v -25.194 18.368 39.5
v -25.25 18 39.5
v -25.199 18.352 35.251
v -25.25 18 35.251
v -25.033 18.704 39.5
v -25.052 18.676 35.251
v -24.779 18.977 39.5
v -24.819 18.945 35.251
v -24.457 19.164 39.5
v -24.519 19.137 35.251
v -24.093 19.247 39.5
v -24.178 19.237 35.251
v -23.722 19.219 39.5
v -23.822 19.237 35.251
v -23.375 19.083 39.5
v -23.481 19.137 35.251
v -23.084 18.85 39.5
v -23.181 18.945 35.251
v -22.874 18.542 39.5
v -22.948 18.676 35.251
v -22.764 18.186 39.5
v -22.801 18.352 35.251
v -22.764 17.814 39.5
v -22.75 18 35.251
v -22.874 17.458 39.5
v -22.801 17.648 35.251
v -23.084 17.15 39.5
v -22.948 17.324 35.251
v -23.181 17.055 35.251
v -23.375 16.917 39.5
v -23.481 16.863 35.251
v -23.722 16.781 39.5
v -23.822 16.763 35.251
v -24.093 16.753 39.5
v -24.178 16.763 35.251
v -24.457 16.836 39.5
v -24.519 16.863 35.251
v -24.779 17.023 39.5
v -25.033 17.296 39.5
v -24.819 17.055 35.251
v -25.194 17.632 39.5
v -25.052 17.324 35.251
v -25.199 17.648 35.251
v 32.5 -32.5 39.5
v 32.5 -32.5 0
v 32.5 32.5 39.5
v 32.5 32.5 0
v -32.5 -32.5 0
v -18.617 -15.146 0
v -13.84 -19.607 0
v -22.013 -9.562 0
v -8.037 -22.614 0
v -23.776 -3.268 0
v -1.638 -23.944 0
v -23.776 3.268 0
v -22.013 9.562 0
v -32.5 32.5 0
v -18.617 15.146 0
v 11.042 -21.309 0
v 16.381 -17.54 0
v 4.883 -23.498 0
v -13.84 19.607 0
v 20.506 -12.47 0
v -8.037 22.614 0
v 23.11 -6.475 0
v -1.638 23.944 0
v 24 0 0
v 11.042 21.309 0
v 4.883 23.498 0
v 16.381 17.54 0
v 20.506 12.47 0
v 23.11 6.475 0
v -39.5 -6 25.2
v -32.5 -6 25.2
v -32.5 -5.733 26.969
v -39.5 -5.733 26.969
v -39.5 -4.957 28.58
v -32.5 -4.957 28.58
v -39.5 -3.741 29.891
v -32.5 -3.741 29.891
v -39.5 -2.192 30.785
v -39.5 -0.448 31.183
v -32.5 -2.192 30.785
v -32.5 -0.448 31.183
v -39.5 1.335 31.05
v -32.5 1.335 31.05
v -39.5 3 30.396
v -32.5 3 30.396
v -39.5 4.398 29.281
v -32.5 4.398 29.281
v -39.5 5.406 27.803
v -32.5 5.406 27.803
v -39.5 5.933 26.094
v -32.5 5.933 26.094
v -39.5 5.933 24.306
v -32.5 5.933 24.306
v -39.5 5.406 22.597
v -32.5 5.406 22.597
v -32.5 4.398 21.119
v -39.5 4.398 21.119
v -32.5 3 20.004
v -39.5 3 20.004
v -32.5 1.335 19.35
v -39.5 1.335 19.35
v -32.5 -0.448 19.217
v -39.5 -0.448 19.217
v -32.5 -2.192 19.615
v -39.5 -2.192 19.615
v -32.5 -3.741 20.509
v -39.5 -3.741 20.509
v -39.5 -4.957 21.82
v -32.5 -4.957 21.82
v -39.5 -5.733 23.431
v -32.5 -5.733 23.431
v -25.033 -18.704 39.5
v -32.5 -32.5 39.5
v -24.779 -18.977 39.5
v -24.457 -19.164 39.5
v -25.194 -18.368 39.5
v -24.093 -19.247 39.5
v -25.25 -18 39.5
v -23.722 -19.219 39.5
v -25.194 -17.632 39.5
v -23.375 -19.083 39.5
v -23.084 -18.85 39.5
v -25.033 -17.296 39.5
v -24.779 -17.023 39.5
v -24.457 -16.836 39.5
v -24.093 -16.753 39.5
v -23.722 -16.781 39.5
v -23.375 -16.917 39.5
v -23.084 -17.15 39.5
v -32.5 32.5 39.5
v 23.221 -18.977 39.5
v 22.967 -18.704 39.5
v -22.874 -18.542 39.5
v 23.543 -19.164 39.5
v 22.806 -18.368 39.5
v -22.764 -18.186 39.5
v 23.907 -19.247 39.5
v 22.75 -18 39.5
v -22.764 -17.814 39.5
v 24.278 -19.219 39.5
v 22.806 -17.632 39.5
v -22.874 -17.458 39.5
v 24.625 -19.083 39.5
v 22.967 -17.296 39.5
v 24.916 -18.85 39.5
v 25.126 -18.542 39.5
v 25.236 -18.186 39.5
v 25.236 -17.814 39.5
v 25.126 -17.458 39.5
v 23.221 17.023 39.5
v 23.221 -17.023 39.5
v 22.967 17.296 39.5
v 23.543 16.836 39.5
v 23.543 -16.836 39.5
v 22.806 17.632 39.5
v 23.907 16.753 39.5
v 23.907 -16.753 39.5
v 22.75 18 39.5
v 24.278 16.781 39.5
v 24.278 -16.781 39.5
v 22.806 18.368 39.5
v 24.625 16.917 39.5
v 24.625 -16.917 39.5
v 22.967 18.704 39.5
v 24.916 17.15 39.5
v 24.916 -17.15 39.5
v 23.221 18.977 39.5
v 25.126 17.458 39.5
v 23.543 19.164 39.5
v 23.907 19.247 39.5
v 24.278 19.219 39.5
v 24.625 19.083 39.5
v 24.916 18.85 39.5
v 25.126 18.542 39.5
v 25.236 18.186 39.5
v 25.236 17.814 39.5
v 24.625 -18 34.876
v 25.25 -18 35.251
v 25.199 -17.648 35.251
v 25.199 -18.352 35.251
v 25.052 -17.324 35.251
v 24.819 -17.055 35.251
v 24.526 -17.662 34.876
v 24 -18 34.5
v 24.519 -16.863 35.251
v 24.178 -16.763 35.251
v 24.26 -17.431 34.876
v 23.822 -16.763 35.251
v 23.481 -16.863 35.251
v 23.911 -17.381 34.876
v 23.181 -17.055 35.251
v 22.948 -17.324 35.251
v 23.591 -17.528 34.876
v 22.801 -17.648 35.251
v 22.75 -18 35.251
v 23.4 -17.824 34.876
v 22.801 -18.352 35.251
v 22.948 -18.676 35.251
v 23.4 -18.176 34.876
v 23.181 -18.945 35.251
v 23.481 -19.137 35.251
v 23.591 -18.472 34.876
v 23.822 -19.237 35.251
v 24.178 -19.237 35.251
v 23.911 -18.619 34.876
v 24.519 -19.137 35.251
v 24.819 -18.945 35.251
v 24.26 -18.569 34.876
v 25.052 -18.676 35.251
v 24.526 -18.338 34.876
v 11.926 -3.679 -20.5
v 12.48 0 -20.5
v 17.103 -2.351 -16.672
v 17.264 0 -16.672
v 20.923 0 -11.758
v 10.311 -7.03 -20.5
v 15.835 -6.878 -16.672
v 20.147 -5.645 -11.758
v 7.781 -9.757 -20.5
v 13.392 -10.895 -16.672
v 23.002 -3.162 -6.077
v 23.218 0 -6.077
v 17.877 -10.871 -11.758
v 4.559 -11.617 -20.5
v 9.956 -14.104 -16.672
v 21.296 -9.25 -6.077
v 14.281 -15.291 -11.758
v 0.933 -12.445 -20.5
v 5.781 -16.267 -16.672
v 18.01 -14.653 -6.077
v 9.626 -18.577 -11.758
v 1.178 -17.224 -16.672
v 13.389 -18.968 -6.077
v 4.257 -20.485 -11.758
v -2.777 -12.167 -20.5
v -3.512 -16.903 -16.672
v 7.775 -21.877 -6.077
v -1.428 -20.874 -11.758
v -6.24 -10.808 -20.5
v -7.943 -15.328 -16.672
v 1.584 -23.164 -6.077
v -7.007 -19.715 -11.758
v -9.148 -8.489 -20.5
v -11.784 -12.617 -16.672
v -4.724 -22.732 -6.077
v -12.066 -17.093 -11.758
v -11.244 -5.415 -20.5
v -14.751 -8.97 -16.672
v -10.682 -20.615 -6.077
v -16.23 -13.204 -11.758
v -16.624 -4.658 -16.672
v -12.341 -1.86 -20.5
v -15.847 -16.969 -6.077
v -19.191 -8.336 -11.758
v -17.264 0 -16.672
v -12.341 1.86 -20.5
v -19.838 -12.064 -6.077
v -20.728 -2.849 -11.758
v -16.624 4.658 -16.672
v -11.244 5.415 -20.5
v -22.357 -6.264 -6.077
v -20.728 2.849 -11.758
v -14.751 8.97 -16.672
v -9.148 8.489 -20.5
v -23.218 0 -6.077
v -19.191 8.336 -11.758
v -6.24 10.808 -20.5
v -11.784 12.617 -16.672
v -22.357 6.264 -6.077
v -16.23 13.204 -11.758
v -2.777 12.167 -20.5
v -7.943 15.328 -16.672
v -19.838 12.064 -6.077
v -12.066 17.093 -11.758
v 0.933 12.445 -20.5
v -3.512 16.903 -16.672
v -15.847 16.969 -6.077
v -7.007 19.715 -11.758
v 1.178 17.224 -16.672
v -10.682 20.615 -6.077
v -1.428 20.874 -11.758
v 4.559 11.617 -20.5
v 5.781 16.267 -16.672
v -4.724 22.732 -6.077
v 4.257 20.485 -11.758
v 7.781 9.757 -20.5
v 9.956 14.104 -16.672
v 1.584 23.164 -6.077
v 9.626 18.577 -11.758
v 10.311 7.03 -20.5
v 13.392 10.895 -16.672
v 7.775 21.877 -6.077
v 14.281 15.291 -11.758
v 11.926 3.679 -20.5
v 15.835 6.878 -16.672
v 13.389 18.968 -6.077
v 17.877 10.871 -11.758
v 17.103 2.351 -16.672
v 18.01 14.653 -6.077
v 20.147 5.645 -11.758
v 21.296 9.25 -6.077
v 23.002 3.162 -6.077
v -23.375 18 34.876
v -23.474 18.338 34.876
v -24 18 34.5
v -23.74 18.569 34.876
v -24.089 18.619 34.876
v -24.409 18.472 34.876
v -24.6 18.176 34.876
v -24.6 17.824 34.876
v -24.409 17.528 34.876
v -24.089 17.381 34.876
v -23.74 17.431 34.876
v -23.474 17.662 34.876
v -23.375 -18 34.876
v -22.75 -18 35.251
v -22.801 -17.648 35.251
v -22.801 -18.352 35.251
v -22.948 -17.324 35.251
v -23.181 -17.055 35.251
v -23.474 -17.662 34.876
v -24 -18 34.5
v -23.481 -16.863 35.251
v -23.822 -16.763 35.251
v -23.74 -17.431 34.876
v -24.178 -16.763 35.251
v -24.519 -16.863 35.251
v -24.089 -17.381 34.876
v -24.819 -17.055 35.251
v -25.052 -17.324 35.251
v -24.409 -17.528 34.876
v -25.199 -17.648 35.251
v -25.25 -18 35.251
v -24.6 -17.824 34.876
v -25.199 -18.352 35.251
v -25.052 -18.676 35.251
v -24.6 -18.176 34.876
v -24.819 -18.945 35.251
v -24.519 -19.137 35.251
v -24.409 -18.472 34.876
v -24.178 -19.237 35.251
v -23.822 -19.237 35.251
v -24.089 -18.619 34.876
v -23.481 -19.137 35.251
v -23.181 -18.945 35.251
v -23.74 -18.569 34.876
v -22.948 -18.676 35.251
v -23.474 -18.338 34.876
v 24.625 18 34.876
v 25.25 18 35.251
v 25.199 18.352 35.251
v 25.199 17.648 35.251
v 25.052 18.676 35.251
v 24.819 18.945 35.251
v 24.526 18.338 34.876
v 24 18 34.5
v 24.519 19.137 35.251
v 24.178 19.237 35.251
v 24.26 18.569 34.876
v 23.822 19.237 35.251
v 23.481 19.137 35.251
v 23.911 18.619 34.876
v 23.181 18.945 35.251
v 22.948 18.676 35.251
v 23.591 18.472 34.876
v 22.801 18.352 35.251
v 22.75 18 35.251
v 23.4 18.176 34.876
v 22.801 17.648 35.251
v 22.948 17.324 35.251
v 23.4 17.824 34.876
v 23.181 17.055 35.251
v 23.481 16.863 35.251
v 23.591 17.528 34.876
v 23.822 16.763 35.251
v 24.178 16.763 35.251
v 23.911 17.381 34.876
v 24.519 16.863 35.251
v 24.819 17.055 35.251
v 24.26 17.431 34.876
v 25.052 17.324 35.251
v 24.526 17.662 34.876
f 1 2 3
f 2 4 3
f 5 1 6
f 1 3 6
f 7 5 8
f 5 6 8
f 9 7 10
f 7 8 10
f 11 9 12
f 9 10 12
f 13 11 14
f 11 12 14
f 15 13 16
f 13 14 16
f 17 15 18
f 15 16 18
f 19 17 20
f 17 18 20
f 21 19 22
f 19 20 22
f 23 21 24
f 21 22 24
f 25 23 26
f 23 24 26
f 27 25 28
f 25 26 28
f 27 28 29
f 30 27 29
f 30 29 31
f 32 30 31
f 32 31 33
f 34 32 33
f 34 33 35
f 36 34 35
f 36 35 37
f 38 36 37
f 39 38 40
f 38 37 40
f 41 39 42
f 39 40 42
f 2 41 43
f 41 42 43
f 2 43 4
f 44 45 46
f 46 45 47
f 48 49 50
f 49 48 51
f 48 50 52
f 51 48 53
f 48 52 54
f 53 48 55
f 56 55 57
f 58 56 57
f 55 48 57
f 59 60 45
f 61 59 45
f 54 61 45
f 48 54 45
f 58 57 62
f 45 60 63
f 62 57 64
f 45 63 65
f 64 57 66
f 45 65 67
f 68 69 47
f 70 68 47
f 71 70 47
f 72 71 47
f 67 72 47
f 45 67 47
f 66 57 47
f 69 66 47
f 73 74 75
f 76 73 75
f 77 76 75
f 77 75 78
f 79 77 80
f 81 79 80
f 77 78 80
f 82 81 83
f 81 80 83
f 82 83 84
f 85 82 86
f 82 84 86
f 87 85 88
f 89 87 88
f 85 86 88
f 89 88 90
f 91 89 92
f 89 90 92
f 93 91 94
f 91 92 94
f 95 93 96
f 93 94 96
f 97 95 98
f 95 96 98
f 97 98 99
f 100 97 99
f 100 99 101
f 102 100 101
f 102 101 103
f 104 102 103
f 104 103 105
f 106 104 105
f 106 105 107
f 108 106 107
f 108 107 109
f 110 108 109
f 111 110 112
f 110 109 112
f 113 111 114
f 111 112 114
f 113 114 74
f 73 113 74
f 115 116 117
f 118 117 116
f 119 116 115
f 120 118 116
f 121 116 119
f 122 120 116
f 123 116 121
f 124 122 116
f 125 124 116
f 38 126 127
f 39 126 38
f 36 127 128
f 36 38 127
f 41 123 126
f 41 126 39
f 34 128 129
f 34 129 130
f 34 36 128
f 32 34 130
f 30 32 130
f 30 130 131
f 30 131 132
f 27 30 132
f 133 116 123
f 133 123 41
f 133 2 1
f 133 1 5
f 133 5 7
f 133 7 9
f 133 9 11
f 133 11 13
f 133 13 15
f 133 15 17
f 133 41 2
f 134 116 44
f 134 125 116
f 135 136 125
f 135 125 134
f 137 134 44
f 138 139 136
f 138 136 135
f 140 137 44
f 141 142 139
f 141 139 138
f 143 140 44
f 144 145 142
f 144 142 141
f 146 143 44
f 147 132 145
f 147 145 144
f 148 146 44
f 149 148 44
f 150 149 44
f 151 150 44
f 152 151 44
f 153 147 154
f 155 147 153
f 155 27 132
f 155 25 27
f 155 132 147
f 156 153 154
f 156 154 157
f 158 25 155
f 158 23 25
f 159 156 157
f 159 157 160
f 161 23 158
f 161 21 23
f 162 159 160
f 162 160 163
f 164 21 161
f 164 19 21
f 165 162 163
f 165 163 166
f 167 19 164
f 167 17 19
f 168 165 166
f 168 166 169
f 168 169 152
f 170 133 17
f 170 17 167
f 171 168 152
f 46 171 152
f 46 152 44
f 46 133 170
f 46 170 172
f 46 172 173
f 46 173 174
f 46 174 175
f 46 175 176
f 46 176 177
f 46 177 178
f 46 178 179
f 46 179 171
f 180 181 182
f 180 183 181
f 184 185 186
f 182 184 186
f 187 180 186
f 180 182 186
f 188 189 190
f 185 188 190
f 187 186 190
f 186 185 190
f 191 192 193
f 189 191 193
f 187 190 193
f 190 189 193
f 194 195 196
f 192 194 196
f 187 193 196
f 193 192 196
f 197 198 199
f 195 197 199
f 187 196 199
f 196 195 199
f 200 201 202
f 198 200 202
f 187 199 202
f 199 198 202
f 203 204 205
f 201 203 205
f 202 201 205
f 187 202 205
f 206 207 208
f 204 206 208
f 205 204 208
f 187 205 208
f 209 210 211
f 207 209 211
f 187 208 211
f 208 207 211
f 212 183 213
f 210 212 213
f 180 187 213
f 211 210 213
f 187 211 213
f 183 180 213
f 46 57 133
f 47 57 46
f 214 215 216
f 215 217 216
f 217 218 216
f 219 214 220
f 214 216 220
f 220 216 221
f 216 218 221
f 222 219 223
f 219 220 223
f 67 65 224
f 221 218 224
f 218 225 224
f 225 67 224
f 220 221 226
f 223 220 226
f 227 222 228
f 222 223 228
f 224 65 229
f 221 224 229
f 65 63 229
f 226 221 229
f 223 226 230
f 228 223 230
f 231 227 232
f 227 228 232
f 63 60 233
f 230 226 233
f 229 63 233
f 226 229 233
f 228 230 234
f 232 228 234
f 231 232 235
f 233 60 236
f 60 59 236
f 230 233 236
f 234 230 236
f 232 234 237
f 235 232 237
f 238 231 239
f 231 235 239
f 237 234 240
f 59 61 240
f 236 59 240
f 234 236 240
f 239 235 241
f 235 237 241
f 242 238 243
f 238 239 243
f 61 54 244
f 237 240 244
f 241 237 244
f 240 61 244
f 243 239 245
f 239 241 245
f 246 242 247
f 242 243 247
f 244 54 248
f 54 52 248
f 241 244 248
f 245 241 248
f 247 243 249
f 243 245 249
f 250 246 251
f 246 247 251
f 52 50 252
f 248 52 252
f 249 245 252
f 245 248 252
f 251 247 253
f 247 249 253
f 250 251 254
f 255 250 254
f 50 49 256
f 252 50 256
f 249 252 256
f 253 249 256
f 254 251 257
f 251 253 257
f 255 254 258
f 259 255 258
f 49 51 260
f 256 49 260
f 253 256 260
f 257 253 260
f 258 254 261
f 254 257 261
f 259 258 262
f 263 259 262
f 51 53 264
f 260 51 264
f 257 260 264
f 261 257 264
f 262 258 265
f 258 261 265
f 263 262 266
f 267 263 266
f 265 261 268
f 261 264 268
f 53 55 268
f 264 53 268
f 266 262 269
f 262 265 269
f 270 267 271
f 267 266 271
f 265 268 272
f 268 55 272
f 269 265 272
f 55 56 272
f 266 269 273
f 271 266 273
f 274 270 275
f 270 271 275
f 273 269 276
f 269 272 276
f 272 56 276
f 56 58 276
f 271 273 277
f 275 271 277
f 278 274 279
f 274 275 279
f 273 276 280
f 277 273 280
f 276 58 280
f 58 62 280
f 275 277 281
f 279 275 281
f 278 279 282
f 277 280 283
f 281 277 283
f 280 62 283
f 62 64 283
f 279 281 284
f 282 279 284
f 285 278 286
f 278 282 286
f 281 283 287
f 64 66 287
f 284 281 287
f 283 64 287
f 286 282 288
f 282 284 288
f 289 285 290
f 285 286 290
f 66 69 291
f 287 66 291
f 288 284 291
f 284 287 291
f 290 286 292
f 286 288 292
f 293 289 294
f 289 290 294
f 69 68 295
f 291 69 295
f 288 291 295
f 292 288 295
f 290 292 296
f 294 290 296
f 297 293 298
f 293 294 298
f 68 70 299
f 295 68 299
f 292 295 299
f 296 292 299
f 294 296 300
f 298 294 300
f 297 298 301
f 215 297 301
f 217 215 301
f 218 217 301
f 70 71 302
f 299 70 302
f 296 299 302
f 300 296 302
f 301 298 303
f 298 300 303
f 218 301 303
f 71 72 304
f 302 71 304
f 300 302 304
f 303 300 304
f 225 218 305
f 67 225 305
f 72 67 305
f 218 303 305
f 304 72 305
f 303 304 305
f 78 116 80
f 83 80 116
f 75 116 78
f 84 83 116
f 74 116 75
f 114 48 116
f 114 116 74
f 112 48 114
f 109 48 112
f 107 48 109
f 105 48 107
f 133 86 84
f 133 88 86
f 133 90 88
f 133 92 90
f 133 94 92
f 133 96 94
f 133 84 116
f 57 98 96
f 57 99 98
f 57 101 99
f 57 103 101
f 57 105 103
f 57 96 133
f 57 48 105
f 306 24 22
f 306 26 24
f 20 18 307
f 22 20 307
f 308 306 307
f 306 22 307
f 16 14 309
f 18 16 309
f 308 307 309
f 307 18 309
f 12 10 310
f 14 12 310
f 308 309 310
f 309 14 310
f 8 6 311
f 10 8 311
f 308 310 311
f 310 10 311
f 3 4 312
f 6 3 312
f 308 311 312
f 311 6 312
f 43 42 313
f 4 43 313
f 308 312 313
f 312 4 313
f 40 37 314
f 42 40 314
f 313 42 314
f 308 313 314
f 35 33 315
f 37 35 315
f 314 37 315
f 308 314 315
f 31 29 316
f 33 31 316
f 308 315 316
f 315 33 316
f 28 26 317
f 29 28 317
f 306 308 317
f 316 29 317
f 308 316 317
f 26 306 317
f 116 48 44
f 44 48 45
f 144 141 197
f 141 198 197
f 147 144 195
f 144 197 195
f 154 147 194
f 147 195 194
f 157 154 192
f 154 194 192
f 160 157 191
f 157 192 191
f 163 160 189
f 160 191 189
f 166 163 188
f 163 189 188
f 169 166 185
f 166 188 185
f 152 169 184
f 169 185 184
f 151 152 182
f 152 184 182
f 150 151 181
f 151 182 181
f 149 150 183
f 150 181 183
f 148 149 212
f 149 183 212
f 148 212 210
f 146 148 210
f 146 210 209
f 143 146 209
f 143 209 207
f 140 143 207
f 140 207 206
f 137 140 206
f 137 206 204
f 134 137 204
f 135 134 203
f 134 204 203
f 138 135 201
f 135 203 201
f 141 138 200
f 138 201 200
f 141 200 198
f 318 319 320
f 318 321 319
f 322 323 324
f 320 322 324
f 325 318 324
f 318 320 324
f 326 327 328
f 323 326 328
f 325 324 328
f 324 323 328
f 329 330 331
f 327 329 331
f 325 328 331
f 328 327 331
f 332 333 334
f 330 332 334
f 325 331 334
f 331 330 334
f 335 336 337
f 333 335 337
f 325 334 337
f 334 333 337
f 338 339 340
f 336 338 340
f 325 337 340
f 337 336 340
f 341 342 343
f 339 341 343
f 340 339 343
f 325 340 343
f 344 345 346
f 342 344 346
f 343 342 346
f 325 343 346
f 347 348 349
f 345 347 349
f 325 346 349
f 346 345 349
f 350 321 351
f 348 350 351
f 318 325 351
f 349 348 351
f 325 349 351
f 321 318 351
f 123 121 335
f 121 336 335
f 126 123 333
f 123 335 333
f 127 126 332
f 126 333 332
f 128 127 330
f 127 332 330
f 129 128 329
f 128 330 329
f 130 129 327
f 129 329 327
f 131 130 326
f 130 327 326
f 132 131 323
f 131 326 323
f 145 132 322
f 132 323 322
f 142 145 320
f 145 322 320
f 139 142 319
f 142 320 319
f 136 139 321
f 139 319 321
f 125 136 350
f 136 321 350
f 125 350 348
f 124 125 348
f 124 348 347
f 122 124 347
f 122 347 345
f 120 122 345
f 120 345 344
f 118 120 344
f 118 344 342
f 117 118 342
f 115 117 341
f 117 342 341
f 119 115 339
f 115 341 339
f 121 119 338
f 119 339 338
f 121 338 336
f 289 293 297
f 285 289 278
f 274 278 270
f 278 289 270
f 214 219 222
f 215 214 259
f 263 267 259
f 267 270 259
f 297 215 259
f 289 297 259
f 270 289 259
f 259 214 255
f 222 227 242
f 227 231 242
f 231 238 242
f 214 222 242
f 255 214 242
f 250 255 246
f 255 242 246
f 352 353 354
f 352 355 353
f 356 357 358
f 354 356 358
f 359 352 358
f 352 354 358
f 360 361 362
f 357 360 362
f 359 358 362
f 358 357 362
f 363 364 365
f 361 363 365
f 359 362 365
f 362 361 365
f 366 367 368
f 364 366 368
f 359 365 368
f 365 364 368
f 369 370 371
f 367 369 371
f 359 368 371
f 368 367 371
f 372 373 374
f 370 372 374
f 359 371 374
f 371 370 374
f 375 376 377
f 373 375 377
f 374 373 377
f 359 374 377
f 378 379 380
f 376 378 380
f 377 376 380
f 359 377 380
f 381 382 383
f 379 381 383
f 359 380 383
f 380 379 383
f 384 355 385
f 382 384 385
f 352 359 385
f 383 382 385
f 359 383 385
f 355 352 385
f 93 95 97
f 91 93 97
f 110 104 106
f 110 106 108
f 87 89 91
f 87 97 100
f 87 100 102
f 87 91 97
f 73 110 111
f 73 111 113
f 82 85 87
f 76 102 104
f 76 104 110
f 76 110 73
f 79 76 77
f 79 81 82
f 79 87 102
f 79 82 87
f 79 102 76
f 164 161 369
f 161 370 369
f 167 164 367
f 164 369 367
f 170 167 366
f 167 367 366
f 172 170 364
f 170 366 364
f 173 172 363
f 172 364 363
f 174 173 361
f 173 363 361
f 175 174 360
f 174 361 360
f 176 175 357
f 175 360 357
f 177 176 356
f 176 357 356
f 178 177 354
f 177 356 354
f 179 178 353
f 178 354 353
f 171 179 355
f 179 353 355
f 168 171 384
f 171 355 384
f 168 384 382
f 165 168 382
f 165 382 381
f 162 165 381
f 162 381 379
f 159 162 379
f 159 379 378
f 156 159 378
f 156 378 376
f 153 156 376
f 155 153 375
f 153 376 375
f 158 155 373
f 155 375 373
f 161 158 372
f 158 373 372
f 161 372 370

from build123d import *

# Parameters (mm, degrees)
SCHIZZO1_W                   = 65
SCHIZZO1_H                   = 65
ESTRUSIONE_ESTRUSIONE1_DEPTH = 39.5
SCHIZZO14_R                  = 6
ESTRUSIONE_ESTRUSIONE2_DEPTH = 7
FORO_FILETTATO_M3_1_D        = 2.5
FORO_FILETTATO_M3_1_DEPTH    = 4.248924226
FORO_FILETTATO_M3_1_TIP      = 0.751075774


with BuildPart() as part:
    # Schizzo1 → Estrusione-Estrusione1 (new body)
    with BuildSketch(Plane.XY):
        Rectangle(SCHIZZO1_W, SCHIZZO1_H)
    extrude(amount=ESTRUSIONE_ESTRUSIONE1_DEPTH)

    # Schizzo2 → Rivoluzione1 (revolve)
    with BuildSketch(Plane(origin=(0, 0, 0), x_dir=(1, 0, 0), z_dir=(0, 1, 0))):
        with BuildLine():
            Line((0, 0), (0, 20.5))
            Line((0, 20.5), (12.479983974, 20.5))
            ThreePointArc((12.479983974, 20.5), (20.922710333, 11.757558943), (24, 0))
            Line((24, 0), (0, 0))
        make_face()
    revolve(axis=Axis((0, 0, 0), (0, 0, -1)))

    # Schizzo14 → Estrusione-Estrusione2 (add)
    with BuildSketch(Plane.ZY.offset(32.5)):
        with Locations(Location((25.2, 0, 0), (0, 0, 270))):
            Circle(SCHIZZO14_R)
    extrude(amount=ESTRUSIONE_ESTRUSIONE2_DEPTH)

    # Foro filettato M3-1
    with Locations(Plane(origin=(-24, 18, 39.5), x_dir=(1, 0, 0), z_dir=(0, 0, 1))):
        with Locations((0, 0), (0, -36), (48, 0), (48, -36)):
            Hole(FORO_FILETTATO_M3_1_D / 2, depth=FORO_FILETTATO_M3_1_DEPTH)
            with Locations((0, 0, -(FORO_FILETTATO_M3_1_DEPTH + FORO_FILETTATO_M3_1_TIP / 2))):  # 118° drill point
                Cone(0, FORO_FILETTATO_M3_1_D / 2, FORO_FILETTATO_M3_1_TIP, mode=Mode.SUBTRACT)


solid = part.part
